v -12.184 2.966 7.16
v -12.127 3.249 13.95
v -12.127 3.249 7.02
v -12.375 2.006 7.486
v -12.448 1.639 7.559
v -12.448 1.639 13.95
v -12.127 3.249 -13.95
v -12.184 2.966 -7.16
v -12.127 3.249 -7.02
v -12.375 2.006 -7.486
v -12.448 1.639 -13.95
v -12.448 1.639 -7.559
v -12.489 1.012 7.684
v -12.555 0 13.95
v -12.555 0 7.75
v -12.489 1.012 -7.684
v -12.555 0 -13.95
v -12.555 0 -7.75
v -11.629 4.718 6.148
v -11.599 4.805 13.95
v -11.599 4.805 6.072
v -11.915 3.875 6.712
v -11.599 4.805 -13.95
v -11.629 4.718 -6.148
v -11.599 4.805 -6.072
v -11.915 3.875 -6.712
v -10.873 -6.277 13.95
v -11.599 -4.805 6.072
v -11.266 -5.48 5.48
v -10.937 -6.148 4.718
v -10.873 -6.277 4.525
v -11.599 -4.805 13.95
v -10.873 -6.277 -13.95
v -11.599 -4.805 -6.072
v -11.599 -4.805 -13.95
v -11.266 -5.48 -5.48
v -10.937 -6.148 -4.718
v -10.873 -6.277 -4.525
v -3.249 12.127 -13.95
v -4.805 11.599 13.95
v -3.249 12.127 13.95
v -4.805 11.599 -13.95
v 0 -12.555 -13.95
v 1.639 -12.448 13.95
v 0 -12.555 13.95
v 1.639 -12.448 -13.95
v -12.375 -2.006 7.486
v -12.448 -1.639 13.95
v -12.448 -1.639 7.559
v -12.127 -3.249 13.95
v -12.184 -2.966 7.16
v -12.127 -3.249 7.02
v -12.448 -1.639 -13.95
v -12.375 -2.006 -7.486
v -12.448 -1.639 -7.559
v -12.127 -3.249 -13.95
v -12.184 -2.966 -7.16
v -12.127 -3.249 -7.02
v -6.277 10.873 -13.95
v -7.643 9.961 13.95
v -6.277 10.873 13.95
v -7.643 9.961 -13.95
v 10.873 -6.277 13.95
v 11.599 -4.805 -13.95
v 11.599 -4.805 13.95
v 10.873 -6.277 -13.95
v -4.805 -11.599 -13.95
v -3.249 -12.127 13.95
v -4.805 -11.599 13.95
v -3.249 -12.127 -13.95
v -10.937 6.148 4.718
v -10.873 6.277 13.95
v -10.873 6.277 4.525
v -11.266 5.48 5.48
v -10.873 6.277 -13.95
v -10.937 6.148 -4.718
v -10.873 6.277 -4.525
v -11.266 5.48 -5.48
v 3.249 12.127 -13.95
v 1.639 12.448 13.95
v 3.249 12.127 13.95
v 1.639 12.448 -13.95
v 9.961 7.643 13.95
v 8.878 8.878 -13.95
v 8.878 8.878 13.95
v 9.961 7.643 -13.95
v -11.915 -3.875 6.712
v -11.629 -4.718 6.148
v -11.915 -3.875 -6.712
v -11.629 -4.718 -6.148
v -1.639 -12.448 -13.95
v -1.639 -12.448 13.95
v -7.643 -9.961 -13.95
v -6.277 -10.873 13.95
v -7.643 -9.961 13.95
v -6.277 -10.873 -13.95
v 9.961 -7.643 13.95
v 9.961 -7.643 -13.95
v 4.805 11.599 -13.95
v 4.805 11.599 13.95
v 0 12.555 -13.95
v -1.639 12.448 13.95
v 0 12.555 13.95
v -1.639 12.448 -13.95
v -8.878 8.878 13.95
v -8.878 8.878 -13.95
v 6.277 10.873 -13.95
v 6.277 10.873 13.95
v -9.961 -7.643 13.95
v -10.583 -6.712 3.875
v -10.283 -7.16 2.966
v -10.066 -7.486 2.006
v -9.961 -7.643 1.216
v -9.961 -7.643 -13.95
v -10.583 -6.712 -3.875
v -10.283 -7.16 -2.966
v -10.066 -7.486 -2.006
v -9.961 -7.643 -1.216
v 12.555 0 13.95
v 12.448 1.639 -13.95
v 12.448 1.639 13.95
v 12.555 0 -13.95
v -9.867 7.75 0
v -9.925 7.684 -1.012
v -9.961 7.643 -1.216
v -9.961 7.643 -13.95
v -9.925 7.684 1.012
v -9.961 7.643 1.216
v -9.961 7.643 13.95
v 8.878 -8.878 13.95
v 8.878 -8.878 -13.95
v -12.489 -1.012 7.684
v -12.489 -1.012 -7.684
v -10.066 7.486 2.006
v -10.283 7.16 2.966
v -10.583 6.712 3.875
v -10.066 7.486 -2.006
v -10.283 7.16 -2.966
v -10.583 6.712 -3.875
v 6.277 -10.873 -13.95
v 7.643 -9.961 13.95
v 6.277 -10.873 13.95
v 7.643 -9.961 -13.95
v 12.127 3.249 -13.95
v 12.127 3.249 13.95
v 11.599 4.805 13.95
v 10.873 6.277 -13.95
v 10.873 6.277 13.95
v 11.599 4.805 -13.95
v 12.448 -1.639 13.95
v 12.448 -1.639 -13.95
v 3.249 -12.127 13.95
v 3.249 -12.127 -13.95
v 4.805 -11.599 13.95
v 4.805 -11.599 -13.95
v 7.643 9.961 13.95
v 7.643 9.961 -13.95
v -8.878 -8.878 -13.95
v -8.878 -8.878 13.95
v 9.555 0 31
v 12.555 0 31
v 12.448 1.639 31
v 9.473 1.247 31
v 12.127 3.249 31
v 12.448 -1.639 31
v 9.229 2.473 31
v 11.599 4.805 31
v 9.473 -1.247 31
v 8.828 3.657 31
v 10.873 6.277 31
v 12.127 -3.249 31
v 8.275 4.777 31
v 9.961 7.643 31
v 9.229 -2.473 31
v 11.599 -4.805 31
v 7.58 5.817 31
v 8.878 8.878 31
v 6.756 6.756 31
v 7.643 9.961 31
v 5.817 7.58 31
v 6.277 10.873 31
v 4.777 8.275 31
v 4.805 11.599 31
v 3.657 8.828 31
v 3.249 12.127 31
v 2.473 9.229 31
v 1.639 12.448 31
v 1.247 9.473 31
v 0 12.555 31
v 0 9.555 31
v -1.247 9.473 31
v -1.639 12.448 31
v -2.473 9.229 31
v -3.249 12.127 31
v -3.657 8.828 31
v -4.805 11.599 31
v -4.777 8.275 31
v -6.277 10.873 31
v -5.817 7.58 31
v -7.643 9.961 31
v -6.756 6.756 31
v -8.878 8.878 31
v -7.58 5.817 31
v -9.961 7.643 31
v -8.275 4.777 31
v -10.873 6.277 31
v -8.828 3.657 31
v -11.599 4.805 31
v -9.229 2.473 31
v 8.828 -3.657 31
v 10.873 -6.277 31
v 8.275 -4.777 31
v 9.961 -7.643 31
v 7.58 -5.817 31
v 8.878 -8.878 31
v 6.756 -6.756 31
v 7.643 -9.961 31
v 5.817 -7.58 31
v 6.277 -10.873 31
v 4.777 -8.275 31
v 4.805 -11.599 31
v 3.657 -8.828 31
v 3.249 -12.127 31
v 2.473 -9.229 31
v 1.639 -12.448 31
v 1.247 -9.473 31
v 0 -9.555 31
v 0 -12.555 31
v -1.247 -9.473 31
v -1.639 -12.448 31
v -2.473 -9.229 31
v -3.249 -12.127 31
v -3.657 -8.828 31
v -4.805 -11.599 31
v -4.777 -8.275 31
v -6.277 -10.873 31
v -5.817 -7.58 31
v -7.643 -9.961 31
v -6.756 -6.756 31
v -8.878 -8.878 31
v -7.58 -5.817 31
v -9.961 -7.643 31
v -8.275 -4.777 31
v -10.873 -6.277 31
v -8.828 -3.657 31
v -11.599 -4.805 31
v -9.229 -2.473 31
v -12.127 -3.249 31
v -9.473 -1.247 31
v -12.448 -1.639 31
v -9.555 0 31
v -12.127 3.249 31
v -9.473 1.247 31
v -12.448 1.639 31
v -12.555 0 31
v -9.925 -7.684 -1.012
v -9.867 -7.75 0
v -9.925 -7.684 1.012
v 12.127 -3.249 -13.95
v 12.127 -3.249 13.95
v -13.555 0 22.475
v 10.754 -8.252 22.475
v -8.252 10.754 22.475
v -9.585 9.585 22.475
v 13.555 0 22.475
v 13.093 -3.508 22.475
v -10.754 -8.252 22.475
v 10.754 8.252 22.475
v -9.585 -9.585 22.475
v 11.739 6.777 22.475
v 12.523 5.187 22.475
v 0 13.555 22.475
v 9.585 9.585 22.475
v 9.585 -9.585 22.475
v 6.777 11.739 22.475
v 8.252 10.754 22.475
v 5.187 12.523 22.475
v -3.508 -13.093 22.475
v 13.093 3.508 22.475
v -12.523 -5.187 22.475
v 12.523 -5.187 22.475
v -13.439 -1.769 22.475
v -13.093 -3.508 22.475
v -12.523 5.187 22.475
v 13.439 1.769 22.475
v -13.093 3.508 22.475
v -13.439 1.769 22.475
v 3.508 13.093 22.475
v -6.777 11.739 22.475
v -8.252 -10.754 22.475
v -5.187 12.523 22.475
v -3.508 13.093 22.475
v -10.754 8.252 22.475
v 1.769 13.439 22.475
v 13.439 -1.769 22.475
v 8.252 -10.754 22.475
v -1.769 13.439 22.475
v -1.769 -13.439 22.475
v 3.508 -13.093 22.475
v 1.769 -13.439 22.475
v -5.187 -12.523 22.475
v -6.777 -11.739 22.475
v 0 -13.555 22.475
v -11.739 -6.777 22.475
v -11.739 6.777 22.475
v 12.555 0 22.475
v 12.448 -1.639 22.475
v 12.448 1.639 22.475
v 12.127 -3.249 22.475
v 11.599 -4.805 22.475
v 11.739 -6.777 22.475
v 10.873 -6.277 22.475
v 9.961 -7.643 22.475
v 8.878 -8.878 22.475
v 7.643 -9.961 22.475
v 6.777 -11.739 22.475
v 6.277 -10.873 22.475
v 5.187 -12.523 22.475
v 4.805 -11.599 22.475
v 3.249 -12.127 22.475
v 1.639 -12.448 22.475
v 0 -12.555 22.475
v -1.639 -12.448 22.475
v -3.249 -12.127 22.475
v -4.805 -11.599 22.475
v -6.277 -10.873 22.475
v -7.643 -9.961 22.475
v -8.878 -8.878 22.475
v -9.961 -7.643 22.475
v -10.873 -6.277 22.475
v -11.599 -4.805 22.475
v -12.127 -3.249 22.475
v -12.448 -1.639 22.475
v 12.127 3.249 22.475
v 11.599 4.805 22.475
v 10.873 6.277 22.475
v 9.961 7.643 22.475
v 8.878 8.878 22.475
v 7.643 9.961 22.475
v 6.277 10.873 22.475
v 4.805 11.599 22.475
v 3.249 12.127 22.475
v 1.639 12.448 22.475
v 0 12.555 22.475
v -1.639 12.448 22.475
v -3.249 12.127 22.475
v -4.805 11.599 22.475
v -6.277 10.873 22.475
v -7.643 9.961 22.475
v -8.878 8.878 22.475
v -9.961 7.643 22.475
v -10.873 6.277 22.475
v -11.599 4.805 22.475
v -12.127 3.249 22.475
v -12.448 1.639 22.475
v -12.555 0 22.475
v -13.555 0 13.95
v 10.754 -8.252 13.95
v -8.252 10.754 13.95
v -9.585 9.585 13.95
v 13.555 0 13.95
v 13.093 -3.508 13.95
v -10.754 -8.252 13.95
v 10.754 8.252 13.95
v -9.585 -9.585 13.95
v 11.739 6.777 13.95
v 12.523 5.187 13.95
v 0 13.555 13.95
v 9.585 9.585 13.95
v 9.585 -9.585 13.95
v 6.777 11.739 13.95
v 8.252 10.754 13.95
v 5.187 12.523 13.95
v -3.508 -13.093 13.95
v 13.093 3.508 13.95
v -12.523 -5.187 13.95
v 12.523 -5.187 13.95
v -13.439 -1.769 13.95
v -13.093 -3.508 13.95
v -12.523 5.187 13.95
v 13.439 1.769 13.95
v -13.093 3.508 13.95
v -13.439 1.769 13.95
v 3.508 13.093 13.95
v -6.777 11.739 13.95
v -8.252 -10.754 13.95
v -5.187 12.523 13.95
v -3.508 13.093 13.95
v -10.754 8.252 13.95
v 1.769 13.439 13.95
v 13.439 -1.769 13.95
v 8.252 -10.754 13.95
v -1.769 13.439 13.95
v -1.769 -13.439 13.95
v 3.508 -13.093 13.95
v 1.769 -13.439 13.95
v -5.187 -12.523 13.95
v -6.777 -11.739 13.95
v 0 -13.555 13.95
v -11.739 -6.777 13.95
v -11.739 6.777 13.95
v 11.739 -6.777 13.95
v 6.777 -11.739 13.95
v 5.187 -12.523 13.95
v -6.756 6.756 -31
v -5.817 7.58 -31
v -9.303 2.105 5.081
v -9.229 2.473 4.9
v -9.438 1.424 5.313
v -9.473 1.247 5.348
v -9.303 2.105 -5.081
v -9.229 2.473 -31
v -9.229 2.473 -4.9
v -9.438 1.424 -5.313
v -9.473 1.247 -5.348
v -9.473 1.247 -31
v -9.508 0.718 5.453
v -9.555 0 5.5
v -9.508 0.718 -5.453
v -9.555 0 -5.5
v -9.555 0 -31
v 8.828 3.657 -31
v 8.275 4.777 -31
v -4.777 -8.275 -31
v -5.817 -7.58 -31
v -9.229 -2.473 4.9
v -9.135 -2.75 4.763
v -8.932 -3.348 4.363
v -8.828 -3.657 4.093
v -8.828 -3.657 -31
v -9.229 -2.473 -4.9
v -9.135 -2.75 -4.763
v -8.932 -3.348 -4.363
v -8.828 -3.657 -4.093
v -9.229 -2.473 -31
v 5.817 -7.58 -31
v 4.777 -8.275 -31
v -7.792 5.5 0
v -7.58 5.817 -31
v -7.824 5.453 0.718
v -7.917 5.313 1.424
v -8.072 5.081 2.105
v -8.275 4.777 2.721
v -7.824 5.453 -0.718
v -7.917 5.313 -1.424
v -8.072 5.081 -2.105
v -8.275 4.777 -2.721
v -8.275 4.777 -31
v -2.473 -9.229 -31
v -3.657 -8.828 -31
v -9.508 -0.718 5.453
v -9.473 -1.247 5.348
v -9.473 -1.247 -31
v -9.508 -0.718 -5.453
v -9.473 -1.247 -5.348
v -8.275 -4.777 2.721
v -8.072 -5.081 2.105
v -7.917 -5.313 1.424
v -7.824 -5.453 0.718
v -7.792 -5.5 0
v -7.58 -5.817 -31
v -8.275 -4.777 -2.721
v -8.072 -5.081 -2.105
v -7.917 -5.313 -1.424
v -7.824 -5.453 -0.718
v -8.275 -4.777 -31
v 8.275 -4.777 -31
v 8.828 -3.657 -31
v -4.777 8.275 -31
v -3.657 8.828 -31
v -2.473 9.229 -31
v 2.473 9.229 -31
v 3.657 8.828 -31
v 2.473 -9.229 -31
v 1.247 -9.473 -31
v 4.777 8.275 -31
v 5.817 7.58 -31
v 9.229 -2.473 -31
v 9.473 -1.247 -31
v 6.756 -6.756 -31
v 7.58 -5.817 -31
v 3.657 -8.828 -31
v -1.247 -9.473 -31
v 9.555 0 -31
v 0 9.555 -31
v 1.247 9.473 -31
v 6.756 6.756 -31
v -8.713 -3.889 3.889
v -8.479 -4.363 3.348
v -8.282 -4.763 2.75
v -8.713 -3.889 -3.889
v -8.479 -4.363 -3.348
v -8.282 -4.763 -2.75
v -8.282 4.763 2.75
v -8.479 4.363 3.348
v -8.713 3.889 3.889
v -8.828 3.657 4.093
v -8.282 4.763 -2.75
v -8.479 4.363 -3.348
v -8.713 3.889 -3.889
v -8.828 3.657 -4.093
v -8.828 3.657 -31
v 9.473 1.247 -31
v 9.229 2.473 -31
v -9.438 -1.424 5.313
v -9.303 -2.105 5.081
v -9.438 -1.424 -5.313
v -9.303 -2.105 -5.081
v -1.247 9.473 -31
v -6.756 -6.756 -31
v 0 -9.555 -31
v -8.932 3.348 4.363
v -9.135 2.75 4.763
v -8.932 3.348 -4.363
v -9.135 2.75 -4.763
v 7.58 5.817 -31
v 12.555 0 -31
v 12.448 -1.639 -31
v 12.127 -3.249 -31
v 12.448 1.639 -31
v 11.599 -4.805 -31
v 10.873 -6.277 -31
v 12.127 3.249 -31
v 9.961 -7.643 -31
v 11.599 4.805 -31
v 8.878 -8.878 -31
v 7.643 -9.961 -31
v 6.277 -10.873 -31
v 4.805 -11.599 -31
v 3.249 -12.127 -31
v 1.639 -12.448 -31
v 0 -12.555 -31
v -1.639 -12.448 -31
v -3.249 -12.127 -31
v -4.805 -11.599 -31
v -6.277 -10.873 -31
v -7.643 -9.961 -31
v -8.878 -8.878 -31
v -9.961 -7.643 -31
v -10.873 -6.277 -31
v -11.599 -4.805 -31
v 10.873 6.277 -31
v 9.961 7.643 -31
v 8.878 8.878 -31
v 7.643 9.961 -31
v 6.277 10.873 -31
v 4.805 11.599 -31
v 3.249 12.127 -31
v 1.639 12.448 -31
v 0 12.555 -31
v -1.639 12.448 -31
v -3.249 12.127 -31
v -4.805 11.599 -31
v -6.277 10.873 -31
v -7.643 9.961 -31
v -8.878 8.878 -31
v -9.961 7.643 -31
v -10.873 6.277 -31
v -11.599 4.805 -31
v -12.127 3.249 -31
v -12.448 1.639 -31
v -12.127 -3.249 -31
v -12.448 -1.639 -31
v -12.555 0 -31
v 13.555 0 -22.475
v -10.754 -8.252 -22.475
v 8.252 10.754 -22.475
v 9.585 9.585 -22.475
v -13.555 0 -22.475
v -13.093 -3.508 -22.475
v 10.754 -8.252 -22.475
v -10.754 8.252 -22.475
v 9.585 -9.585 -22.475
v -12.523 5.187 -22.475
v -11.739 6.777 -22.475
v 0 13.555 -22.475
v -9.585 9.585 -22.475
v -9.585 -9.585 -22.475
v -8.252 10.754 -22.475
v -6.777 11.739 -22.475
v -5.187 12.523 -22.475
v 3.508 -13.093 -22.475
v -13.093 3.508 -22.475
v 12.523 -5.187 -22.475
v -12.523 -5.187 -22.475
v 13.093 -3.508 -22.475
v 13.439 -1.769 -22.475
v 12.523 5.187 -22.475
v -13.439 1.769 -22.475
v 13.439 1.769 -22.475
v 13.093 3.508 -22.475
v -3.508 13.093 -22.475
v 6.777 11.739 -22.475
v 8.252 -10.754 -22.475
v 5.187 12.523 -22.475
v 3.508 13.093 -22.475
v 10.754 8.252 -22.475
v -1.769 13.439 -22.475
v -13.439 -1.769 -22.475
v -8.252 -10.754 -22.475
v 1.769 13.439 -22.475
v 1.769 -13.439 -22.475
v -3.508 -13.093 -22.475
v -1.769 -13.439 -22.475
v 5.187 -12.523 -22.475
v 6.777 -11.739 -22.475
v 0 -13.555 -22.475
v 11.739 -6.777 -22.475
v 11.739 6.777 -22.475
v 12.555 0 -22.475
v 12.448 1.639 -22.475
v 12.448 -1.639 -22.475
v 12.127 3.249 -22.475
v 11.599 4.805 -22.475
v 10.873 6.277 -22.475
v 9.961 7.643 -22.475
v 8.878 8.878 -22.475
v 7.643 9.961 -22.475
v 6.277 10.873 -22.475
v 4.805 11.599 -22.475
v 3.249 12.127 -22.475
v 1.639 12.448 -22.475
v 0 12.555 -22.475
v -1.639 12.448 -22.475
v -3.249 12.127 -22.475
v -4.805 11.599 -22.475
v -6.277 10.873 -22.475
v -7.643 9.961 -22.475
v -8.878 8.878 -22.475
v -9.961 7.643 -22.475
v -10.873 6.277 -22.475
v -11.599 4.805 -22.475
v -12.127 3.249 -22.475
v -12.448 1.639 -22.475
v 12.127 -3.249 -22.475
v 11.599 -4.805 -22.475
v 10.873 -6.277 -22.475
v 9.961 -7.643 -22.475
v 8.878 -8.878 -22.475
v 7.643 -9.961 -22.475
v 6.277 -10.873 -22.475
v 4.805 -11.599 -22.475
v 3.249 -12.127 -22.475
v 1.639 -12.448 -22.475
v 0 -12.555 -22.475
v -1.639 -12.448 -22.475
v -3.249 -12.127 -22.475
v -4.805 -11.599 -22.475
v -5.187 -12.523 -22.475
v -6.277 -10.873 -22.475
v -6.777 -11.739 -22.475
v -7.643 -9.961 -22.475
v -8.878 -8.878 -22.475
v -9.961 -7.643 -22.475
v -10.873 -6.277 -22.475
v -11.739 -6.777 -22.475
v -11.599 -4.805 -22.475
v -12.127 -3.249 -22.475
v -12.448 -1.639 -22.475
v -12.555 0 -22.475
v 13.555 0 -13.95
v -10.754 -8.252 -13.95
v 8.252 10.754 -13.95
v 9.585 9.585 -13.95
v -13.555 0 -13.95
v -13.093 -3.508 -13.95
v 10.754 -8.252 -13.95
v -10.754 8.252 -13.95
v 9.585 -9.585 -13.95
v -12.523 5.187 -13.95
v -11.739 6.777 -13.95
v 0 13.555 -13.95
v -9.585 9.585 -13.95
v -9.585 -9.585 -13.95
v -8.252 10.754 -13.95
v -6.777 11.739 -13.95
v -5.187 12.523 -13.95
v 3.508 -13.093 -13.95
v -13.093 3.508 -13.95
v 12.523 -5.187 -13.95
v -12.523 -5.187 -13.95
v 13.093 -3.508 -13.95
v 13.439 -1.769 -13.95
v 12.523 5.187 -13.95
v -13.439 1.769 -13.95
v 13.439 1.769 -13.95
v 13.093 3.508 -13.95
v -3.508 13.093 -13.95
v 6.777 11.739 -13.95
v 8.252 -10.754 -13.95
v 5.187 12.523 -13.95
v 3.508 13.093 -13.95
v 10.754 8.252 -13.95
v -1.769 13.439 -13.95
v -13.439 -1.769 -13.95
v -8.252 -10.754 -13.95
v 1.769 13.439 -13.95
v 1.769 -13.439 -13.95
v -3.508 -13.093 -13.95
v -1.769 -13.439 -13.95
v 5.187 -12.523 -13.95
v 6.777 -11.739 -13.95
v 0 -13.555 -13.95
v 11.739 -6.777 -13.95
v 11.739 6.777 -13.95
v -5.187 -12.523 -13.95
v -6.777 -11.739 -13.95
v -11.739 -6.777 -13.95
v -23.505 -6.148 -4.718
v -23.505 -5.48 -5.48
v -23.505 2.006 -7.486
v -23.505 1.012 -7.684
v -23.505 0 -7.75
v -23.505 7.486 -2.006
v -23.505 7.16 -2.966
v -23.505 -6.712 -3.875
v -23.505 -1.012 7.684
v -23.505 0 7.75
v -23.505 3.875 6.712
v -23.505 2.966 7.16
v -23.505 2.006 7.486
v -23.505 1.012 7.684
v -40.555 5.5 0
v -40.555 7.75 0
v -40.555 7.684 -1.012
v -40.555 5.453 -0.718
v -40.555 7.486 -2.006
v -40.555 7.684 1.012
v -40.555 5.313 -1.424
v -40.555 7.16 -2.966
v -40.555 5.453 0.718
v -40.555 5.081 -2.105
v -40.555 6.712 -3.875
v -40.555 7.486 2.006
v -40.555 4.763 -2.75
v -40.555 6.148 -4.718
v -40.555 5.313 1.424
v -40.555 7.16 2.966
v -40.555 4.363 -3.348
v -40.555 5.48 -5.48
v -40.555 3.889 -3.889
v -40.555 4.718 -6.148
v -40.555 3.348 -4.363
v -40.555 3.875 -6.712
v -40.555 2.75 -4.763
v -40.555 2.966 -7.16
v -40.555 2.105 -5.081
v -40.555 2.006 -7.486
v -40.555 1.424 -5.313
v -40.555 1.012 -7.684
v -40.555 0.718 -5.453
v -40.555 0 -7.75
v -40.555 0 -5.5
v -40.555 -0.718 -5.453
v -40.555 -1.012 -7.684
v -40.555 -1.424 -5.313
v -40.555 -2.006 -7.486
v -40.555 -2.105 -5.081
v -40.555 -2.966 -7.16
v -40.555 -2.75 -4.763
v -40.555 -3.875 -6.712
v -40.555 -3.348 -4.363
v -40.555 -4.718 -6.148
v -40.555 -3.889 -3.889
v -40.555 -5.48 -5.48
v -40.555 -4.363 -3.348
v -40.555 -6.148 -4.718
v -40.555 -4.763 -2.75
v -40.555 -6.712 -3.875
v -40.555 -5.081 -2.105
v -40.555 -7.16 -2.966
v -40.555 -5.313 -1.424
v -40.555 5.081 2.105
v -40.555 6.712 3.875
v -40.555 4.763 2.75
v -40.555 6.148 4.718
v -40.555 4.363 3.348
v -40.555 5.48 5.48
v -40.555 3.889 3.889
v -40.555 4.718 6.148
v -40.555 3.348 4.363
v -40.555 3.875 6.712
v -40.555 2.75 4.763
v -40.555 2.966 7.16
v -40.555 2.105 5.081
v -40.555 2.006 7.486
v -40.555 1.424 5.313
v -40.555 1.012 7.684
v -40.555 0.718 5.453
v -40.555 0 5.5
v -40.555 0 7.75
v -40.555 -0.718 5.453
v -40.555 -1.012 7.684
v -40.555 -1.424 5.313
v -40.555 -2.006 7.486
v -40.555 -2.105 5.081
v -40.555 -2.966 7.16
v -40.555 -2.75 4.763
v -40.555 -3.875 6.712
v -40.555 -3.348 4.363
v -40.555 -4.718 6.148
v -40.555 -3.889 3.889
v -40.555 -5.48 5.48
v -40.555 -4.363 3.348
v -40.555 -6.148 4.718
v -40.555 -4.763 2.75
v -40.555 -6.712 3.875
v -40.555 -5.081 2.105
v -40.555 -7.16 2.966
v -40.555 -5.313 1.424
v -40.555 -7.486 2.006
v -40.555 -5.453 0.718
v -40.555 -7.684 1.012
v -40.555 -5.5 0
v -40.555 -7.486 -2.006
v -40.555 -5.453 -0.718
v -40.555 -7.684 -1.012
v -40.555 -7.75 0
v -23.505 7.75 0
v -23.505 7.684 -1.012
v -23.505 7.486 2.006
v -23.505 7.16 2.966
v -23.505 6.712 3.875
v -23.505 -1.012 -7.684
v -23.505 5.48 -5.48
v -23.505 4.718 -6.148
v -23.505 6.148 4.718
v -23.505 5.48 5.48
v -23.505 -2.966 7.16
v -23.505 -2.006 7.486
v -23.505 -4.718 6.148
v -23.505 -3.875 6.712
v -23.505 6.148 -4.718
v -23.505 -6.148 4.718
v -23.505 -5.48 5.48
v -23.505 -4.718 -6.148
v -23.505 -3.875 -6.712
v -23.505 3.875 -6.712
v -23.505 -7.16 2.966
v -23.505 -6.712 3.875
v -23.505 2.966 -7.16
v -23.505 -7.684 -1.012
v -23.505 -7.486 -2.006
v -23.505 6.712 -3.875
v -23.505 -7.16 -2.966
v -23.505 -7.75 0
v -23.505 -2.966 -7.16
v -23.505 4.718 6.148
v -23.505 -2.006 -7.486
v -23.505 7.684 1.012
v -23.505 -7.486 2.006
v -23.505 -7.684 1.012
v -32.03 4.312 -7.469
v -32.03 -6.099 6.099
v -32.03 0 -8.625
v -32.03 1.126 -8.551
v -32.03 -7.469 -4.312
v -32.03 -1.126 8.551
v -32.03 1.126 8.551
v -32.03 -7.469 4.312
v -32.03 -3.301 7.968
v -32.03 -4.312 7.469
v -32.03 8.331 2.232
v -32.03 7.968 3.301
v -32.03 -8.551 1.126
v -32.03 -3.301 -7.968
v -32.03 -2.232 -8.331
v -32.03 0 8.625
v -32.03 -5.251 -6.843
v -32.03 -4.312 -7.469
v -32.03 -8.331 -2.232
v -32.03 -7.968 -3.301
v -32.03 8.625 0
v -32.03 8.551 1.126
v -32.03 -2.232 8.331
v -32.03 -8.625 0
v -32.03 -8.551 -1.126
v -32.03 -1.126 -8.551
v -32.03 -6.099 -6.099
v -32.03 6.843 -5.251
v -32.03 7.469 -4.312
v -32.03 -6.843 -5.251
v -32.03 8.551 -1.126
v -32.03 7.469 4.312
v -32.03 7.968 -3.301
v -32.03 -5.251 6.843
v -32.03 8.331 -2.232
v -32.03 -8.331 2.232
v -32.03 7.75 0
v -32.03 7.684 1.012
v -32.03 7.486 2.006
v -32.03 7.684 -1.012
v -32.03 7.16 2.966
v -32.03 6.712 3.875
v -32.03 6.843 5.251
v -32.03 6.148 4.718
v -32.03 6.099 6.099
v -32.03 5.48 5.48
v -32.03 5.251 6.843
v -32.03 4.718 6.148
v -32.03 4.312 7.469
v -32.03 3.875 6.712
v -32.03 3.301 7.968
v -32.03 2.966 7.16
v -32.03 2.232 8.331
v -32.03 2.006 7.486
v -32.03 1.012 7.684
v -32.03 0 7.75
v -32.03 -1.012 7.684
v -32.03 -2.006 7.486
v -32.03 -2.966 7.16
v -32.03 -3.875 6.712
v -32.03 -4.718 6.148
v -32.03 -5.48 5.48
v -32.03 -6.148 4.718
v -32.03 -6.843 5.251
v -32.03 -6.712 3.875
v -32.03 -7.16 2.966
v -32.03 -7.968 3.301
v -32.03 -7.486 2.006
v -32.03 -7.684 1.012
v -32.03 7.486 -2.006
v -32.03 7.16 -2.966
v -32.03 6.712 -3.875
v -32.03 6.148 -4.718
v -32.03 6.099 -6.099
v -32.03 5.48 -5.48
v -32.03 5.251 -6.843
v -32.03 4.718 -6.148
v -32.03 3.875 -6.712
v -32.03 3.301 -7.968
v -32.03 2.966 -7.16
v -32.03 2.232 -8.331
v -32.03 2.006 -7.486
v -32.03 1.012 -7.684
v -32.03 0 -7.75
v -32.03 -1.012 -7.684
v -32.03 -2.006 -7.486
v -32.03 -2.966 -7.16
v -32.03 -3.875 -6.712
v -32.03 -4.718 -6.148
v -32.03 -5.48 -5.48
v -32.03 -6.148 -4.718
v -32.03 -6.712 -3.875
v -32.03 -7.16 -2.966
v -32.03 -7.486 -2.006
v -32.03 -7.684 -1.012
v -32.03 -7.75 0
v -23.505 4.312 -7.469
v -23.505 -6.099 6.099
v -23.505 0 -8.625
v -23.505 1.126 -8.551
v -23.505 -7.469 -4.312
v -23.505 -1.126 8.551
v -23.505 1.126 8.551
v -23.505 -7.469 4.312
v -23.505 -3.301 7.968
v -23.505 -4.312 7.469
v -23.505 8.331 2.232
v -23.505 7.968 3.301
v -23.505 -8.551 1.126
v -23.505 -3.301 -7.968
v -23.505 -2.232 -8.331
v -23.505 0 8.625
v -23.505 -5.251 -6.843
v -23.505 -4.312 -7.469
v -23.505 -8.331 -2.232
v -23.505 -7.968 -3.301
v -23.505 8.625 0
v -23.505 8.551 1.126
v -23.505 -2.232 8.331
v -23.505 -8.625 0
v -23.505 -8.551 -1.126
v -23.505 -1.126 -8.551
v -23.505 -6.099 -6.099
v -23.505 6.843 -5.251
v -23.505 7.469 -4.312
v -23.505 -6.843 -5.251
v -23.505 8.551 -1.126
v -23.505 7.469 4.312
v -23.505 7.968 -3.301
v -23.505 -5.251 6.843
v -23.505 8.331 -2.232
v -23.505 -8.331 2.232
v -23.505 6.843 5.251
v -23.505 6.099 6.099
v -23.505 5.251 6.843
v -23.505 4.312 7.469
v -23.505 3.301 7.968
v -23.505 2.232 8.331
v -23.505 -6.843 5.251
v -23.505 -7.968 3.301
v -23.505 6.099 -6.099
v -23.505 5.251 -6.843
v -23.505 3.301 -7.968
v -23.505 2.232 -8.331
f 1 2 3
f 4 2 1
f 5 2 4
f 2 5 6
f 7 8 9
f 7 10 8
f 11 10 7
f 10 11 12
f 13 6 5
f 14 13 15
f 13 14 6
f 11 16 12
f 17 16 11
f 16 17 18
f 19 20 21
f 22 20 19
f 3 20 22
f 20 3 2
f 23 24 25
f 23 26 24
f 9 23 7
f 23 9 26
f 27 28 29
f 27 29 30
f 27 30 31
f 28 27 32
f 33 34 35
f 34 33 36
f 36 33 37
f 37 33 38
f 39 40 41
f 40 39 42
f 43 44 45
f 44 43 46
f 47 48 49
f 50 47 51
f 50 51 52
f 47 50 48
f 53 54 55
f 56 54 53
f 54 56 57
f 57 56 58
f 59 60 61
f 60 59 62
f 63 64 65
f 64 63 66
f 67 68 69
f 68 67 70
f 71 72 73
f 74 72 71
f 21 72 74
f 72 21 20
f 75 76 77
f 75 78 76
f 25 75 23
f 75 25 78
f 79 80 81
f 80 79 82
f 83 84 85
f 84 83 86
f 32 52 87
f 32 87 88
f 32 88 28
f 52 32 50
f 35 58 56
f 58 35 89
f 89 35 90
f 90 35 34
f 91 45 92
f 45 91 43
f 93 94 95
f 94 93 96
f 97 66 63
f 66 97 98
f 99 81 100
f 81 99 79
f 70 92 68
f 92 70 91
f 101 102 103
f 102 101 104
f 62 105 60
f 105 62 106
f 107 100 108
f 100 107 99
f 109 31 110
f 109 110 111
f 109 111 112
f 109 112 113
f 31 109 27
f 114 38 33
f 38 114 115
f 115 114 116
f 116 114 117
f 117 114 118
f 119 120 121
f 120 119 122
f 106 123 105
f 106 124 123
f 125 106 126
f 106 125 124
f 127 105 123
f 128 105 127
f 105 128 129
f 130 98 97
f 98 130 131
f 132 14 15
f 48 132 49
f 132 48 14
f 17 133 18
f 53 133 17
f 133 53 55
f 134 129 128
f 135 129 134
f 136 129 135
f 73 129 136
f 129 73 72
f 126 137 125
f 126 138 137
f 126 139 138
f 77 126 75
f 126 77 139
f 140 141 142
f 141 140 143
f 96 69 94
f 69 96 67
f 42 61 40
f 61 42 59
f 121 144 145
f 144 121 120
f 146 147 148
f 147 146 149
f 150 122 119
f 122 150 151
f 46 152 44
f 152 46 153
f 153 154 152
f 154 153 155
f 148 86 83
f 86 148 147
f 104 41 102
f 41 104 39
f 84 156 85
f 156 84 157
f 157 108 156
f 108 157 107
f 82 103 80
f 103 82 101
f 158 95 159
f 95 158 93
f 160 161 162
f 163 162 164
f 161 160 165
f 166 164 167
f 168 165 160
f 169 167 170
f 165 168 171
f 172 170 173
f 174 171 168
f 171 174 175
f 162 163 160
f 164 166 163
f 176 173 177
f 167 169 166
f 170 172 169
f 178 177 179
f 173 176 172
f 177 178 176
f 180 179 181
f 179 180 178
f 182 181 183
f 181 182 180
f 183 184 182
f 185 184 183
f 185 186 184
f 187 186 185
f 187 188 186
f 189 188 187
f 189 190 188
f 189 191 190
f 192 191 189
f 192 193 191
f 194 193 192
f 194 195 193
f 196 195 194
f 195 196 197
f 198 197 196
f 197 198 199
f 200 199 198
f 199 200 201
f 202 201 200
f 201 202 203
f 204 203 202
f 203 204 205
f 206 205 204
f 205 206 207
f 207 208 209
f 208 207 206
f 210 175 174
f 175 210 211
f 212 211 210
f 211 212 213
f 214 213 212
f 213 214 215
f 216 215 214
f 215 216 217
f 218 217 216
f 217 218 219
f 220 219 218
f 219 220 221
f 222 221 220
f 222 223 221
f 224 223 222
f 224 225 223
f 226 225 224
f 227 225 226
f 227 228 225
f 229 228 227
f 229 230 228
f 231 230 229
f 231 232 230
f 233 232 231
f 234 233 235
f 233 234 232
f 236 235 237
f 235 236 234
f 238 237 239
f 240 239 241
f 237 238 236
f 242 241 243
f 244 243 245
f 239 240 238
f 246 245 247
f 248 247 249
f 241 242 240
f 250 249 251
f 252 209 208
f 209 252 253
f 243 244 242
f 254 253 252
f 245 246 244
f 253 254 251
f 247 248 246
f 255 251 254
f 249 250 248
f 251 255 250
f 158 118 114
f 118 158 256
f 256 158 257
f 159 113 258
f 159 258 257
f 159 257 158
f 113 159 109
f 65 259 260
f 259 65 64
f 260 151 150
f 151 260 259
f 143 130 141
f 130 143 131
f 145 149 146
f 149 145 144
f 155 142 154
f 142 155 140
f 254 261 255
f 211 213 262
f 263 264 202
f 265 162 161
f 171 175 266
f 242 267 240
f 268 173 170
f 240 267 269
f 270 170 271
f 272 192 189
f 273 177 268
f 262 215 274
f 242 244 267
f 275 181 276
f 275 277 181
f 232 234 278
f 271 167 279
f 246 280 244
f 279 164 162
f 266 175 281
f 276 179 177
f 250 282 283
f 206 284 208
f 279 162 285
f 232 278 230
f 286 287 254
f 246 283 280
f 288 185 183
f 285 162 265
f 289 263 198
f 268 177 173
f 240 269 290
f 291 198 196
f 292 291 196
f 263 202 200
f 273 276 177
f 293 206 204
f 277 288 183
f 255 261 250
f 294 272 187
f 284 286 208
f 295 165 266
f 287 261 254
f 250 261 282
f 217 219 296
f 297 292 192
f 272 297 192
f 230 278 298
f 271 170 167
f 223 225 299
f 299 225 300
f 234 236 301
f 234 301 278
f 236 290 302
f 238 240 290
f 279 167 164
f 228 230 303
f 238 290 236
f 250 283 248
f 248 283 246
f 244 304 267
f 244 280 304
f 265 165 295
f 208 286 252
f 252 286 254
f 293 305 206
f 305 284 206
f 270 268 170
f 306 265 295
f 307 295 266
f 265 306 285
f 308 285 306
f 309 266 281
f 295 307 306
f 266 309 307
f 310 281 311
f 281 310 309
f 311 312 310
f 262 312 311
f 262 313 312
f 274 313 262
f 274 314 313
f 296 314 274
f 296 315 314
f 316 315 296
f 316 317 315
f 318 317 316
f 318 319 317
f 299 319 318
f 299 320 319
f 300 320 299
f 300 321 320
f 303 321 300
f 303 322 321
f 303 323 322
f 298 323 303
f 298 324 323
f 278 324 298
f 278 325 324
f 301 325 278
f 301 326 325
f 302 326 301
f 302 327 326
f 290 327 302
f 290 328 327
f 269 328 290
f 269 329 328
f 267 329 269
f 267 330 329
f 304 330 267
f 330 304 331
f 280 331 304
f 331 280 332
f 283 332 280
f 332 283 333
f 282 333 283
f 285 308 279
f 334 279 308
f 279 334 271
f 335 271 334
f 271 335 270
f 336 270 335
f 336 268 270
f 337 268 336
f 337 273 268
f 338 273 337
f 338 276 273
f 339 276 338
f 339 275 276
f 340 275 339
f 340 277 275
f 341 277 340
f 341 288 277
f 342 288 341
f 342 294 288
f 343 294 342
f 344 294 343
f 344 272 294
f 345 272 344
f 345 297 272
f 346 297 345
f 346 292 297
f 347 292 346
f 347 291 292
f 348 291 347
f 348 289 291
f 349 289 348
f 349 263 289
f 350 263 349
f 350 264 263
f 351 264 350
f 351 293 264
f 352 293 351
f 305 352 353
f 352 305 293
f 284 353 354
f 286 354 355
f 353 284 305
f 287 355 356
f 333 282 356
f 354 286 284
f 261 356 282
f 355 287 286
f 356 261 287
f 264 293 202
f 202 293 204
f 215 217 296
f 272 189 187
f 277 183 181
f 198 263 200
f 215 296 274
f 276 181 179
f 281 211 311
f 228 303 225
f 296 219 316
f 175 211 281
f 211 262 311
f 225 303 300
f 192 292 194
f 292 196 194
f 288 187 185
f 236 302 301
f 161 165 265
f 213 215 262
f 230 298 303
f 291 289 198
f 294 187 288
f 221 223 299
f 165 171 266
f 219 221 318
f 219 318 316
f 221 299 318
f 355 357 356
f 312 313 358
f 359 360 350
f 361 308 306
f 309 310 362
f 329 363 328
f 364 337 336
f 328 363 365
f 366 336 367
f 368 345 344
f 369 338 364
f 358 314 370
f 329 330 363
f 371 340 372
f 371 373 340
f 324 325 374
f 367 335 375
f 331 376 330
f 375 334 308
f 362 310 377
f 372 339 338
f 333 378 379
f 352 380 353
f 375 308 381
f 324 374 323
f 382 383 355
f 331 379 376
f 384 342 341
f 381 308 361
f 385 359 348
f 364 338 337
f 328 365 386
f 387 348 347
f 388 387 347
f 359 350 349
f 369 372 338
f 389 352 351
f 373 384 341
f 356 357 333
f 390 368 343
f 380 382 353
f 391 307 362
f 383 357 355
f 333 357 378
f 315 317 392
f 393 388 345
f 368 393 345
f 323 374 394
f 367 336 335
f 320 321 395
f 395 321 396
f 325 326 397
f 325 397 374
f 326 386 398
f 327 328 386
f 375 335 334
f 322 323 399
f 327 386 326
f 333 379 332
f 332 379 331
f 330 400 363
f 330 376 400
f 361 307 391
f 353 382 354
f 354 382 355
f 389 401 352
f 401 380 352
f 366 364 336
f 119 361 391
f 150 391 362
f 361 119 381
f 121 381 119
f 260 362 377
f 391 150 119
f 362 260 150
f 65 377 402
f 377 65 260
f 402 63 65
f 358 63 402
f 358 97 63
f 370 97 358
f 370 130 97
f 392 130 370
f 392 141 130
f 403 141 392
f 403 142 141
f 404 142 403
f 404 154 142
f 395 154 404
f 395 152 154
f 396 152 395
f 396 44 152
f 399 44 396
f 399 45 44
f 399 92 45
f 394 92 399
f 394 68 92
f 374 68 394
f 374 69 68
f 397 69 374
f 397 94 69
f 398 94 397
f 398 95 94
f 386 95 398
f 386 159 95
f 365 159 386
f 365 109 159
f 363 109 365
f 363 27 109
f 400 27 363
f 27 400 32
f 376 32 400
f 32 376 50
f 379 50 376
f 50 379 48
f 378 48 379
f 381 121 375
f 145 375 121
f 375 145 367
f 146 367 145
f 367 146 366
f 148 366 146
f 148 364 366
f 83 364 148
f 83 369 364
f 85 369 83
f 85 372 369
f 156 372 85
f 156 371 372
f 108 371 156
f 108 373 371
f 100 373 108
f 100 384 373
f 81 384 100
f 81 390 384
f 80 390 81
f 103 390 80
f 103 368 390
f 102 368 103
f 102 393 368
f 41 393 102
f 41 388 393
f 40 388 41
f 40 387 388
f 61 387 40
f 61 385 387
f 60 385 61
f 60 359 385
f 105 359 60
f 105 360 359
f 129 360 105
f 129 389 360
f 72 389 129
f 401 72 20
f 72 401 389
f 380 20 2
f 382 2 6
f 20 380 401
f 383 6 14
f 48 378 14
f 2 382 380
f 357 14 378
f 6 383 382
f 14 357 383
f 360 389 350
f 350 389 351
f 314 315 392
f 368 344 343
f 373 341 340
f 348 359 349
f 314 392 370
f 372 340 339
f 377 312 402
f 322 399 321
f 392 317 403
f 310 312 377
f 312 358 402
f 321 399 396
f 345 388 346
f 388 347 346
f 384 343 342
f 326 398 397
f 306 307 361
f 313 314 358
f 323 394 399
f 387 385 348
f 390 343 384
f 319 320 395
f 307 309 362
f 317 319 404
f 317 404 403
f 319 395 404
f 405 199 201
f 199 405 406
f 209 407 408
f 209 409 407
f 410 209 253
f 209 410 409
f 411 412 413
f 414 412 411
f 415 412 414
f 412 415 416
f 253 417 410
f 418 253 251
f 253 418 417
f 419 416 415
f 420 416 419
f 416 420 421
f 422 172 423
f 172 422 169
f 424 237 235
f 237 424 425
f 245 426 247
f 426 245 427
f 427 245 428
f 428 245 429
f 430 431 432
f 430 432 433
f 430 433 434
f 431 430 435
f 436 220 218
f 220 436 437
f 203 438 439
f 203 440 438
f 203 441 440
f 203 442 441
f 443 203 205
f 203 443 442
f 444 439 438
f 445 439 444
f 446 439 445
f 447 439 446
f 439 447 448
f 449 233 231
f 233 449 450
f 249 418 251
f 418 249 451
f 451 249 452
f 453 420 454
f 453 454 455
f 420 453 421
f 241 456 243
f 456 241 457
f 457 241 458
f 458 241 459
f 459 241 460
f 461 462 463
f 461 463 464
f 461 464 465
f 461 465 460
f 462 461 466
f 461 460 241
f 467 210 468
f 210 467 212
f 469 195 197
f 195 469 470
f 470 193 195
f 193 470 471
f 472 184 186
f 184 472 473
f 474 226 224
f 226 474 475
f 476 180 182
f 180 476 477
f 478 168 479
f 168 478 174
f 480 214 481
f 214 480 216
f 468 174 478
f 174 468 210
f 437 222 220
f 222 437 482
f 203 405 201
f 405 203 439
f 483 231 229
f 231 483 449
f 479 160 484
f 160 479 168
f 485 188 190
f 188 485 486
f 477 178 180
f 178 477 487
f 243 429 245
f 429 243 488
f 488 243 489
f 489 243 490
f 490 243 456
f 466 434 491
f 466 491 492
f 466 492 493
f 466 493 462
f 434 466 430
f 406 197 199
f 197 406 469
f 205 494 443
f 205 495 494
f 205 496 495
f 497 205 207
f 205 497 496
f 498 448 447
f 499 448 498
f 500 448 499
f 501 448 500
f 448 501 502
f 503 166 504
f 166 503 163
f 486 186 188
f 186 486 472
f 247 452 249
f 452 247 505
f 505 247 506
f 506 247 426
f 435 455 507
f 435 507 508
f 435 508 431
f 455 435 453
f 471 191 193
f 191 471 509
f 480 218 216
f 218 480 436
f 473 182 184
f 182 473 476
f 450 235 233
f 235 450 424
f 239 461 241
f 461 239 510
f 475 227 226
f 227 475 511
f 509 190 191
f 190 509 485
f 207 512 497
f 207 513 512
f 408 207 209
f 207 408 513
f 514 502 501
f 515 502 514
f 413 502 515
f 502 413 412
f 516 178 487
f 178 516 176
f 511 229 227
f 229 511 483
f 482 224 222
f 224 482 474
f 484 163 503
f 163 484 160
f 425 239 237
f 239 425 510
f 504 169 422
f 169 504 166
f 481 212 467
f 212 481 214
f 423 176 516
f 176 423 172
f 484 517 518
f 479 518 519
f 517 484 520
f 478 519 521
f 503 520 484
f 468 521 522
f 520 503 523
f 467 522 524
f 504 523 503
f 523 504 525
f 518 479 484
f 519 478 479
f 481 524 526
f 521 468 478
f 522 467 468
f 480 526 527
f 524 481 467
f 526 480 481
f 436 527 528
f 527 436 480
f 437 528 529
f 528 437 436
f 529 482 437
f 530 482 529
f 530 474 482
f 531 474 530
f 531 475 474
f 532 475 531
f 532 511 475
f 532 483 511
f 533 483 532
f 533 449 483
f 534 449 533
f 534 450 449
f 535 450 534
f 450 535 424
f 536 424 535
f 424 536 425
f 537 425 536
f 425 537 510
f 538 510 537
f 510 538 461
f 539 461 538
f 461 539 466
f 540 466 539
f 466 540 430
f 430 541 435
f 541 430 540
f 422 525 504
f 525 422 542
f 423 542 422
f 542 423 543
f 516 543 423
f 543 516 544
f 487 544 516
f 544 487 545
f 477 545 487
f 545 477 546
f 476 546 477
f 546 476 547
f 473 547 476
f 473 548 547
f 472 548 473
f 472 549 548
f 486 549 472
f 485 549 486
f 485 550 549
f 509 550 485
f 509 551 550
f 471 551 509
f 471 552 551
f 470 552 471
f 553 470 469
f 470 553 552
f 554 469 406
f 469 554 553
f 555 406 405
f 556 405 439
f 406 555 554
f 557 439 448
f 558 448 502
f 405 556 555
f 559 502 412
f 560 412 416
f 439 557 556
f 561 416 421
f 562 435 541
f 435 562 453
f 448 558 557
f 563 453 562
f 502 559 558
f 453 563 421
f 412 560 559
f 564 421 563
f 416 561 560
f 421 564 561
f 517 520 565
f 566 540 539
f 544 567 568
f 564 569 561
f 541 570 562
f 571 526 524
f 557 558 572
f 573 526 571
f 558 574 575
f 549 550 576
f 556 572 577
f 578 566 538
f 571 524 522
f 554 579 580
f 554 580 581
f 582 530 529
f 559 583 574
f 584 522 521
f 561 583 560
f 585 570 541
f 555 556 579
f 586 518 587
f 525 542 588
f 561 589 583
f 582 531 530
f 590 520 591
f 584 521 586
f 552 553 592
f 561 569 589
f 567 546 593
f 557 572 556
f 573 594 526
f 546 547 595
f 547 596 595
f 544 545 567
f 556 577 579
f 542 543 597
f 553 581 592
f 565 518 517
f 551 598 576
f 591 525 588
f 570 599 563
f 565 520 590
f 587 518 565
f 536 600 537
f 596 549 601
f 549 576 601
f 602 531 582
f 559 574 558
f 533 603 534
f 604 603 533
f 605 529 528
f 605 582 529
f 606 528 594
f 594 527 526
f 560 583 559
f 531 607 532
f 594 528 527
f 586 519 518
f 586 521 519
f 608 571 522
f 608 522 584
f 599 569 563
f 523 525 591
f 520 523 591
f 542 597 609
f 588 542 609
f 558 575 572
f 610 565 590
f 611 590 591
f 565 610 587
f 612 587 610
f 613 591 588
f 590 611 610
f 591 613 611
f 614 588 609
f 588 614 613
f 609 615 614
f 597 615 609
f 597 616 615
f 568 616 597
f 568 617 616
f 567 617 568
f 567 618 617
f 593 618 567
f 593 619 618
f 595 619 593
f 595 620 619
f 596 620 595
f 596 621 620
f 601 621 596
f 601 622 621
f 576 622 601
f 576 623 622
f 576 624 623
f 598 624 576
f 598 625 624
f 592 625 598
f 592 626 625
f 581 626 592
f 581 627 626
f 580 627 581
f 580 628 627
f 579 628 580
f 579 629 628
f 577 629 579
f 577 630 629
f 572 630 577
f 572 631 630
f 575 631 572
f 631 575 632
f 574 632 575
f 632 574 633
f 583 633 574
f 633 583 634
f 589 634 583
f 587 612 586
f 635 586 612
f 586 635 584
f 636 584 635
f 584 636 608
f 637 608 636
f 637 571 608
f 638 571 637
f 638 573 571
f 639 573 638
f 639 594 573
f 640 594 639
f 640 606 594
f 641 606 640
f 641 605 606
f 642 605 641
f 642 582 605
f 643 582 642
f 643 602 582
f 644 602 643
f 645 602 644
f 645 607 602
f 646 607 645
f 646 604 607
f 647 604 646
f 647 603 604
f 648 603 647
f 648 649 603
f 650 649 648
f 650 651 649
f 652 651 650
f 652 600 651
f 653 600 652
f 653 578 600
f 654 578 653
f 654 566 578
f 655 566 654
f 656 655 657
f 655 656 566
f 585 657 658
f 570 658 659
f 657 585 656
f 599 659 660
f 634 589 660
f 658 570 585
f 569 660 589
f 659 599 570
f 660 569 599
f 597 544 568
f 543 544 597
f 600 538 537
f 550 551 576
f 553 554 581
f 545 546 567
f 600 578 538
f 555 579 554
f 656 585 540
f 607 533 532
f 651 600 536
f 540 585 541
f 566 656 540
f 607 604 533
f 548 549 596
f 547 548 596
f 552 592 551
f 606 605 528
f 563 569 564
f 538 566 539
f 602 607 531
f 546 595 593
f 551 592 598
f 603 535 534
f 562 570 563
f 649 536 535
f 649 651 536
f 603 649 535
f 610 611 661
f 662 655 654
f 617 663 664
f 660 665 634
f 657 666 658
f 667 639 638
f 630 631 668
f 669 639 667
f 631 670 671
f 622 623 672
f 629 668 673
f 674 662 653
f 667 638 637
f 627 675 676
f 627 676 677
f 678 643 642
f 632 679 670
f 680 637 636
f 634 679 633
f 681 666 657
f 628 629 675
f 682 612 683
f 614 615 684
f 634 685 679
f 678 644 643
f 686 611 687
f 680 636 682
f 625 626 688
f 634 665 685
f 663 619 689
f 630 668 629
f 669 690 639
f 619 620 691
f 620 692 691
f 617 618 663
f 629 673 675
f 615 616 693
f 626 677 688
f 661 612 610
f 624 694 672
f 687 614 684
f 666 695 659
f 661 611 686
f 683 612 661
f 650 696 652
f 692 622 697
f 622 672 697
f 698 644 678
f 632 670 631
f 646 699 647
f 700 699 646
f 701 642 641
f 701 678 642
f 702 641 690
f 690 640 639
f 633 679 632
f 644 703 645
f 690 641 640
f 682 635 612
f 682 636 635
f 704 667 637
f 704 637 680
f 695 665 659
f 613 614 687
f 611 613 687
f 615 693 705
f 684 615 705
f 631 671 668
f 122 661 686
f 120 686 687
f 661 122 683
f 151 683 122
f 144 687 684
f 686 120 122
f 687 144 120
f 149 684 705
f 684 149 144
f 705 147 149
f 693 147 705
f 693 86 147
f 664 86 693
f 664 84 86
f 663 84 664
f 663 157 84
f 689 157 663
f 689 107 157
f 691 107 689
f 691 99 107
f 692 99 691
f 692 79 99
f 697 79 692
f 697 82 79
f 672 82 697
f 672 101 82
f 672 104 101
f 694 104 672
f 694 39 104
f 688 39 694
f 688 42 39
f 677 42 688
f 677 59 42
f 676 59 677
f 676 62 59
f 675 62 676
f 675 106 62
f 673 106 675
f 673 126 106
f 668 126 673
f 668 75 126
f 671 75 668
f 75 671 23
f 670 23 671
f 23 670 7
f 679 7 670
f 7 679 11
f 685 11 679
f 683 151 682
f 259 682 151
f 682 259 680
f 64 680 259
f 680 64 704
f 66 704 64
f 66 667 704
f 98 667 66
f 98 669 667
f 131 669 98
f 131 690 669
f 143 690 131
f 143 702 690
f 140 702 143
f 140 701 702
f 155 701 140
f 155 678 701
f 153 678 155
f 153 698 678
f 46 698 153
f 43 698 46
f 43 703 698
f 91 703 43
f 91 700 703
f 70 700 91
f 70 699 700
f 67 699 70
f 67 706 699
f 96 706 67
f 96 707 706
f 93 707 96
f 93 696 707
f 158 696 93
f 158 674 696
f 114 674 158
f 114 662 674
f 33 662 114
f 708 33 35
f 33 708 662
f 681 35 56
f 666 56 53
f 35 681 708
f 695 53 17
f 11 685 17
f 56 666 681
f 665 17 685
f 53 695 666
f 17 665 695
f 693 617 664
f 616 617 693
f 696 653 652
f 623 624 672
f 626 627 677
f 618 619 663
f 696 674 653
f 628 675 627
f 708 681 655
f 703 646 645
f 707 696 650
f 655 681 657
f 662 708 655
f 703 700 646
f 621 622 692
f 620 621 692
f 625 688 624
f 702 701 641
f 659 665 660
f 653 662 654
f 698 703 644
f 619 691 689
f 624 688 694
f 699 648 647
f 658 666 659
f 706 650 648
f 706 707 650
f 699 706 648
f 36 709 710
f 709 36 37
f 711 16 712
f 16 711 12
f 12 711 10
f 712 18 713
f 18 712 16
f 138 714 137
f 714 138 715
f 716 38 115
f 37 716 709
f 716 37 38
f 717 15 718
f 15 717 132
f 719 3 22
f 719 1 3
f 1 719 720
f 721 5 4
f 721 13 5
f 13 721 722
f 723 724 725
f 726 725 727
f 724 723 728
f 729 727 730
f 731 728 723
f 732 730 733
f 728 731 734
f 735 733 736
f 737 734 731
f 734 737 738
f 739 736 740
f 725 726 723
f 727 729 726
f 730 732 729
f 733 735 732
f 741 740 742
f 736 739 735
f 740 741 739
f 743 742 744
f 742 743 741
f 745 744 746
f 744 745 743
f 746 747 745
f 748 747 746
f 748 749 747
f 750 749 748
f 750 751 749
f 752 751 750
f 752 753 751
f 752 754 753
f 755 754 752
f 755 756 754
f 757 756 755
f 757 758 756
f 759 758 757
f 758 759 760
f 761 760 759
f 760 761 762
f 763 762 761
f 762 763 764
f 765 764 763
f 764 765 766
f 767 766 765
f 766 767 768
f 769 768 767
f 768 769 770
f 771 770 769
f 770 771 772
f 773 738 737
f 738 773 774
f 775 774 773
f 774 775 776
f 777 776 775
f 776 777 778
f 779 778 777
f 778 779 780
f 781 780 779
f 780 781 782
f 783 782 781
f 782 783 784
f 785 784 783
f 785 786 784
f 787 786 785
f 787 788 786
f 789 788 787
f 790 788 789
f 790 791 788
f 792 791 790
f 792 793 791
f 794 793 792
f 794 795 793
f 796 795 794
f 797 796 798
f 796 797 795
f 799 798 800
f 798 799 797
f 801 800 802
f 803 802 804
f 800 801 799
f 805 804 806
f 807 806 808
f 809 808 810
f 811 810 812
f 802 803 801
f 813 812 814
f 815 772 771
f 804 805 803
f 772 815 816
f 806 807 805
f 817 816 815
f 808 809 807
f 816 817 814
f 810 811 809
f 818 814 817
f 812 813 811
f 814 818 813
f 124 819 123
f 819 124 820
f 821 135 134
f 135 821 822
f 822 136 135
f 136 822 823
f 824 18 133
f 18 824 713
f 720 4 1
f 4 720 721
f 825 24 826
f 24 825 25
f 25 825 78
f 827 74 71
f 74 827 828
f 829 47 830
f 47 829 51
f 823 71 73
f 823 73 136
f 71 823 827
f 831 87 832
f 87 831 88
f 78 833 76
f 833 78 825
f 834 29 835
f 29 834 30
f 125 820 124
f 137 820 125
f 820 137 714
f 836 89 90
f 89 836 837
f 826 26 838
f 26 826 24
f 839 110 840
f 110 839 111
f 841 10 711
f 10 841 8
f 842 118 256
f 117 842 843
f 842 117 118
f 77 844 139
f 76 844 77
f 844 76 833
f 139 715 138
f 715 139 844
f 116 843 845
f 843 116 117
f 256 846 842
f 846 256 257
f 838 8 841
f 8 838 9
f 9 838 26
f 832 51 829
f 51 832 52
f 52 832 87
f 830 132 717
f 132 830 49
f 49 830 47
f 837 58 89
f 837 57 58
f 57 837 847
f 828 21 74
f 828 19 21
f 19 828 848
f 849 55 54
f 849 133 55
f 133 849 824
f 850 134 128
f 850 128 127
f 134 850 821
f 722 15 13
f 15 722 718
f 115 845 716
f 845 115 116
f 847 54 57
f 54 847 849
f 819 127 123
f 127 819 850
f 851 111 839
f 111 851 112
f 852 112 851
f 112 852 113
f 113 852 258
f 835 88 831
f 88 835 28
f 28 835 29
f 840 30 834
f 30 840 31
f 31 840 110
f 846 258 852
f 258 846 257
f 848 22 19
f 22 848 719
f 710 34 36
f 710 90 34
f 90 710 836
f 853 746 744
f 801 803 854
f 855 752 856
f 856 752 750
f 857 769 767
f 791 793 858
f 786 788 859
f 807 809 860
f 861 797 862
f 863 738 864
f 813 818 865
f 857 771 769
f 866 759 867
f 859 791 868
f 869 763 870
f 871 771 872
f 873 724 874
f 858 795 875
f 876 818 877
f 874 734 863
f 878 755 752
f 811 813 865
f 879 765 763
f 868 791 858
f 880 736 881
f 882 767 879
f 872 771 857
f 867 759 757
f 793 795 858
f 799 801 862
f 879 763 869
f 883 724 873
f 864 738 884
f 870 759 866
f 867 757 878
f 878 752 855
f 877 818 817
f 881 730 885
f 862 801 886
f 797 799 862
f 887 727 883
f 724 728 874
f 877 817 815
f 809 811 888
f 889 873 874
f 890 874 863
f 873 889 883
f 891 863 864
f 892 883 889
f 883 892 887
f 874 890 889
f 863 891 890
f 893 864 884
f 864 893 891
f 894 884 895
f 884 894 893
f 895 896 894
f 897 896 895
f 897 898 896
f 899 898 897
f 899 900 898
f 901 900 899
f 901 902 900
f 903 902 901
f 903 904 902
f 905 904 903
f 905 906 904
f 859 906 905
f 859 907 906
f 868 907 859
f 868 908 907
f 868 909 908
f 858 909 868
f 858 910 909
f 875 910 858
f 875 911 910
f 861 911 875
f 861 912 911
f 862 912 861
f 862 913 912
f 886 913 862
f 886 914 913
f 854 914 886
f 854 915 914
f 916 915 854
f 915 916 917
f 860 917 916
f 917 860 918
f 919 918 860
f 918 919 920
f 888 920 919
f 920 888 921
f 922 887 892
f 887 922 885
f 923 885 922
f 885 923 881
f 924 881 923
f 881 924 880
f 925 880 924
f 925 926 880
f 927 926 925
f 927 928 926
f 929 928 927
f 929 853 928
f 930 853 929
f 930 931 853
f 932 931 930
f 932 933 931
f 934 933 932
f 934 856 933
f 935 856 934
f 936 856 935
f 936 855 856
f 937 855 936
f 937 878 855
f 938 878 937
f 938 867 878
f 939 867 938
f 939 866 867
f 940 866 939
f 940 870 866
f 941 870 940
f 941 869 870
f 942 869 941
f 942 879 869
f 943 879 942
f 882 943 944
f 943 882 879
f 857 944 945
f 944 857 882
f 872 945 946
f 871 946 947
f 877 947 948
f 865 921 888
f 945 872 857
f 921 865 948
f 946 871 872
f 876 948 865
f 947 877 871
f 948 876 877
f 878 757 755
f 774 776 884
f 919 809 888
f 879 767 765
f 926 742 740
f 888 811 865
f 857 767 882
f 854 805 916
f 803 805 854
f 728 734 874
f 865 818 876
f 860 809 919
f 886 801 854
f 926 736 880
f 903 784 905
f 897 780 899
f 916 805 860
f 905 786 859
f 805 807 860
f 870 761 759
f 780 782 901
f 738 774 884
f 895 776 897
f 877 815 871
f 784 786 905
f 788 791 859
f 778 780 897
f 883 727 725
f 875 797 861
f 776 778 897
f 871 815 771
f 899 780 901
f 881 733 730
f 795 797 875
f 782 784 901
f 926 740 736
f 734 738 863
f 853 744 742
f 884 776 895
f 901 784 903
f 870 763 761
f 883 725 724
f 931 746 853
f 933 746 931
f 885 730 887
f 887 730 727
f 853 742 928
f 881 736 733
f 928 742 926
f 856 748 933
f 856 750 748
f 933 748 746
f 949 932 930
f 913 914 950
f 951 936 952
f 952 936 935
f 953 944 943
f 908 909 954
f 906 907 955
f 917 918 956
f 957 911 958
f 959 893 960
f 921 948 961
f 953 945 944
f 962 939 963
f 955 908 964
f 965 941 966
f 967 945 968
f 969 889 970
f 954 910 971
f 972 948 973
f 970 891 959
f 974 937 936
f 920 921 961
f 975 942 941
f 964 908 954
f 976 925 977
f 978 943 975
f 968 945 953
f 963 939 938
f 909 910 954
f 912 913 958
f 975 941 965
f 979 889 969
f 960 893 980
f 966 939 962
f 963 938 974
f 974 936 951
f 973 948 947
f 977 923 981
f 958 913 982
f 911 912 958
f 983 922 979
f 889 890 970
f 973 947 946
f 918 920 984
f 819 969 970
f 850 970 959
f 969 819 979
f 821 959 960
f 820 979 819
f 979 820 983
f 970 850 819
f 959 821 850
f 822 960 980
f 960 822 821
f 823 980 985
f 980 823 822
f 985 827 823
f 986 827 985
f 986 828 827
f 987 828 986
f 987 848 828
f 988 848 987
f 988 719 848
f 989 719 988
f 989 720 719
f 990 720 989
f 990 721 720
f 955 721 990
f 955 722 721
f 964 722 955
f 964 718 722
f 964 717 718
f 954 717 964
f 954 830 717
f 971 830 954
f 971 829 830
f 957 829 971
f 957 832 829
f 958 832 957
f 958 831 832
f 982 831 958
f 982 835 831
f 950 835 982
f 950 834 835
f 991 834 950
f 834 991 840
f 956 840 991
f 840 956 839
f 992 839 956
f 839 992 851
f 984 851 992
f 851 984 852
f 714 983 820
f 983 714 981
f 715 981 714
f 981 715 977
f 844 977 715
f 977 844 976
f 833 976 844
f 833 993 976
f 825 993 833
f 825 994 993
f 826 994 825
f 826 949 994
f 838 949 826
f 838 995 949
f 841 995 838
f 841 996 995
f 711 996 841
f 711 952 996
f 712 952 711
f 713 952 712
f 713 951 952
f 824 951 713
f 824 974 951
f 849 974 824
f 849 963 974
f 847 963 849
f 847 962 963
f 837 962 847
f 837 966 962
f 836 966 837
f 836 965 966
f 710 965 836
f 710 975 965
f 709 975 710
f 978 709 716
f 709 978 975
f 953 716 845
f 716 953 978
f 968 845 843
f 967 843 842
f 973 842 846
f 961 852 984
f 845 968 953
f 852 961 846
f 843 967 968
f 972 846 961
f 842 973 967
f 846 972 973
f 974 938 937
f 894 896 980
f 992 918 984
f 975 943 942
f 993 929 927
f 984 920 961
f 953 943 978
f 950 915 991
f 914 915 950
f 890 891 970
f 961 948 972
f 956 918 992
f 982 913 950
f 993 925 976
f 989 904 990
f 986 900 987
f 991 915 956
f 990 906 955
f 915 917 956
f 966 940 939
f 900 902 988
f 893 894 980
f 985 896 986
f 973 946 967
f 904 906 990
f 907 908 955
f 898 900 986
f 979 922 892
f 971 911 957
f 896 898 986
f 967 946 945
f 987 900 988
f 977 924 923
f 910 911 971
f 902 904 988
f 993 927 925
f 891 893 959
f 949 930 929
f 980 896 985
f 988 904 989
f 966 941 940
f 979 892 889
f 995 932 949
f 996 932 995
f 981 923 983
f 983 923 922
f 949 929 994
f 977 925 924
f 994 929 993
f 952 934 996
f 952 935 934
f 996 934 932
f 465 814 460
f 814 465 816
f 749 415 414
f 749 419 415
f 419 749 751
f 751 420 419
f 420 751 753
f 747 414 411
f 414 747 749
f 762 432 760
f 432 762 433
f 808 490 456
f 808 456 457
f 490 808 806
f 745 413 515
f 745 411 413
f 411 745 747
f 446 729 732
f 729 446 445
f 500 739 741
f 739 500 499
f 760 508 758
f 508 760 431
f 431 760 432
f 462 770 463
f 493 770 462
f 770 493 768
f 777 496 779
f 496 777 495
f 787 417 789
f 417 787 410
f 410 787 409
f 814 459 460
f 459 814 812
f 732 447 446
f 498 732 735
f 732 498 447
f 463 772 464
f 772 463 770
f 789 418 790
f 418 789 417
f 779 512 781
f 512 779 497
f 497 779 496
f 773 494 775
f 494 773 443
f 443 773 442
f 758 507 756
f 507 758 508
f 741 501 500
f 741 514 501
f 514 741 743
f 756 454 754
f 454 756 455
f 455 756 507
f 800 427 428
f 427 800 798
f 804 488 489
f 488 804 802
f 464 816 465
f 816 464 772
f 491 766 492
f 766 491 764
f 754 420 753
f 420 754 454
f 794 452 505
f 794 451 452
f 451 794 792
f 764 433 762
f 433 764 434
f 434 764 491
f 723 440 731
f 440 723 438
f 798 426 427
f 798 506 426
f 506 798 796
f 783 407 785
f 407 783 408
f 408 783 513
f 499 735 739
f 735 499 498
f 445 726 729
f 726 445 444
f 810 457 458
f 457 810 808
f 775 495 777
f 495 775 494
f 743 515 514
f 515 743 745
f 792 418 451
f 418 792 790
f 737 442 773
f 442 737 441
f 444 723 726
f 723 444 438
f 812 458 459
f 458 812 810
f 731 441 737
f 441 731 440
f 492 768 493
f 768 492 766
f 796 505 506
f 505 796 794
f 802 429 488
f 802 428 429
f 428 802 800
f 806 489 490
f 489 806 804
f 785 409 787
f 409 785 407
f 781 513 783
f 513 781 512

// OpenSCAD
// Customizable Hose Tee

//Height of Tee
total_t_length=62;
//Diameter of main part of Tee
main_t_diameter=25.11;
//Height of barbs on Tee
main_t_barb_height=2;
//Wall thickness of main part of Tee
main_t_wall_thickness=3;

//Diameter of Tee portion of Tee
secondary_diameter=15.5;
//Height of barbs on Tee portion of Tee
secondary_barb_height=1.75;
//Wall thickness of Tee portion of Tee
secondary_wall_thickness=2.25;

difference() {
  union() {
    translate([0,0,total_t_length/2]){
      rotate(a=[0,180,0]){
        hose_barb(total_t_length/2, main_t_diameter, main_t_barb_height, main_t_wall_thickness);
      }
    }

    translate([0,0,-total_t_length/2]){
      rotate(a=[0,0,0]){
        hose_barb(total_t_length/2, main_t_diameter, main_t_barb_height, main_t_wall_thickness);
      }
    }
    translate([-(total_t_length/2 + main_t_diameter/2 - main_t_wall_thickness),0,0]){
      rotate(a=[0,90,0]){
        hose_barb(total_t_length/2, secondary_diameter, secondary_barb_height, secondary_wall_thickness);
      }
    }
  }
  rotate(a=[0,90,0]){
    translate([0,0,-total_t_length]){
      cylinder(h=total_t_length, d=secondary_diameter- (secondary_wall_thickness*2), $fn=48);
    }
  }
}



module hose_barb(height, diameter, barb_height, wall_thickness)
{ 
  end_barb_height = height - (height * 0.45);
  difference(){
    union(){
      cylinder(h=height,d=diameter,$fn=48);//pipe
      cylinder(h=end_barb_height/2,d1=diameter,d2=diameter+barb_height,$fn=48);//barb
      translate([0,0,end_barb_height/2]){
        cylinder(h=end_barb_height/2,d1=diameter,d2=diameter+barb_height,$fn=48);//barb
      }
    }
    cylinder(h=height,d=diameter - (wall_thickness*2),$fn=48);//hole
  }
}
